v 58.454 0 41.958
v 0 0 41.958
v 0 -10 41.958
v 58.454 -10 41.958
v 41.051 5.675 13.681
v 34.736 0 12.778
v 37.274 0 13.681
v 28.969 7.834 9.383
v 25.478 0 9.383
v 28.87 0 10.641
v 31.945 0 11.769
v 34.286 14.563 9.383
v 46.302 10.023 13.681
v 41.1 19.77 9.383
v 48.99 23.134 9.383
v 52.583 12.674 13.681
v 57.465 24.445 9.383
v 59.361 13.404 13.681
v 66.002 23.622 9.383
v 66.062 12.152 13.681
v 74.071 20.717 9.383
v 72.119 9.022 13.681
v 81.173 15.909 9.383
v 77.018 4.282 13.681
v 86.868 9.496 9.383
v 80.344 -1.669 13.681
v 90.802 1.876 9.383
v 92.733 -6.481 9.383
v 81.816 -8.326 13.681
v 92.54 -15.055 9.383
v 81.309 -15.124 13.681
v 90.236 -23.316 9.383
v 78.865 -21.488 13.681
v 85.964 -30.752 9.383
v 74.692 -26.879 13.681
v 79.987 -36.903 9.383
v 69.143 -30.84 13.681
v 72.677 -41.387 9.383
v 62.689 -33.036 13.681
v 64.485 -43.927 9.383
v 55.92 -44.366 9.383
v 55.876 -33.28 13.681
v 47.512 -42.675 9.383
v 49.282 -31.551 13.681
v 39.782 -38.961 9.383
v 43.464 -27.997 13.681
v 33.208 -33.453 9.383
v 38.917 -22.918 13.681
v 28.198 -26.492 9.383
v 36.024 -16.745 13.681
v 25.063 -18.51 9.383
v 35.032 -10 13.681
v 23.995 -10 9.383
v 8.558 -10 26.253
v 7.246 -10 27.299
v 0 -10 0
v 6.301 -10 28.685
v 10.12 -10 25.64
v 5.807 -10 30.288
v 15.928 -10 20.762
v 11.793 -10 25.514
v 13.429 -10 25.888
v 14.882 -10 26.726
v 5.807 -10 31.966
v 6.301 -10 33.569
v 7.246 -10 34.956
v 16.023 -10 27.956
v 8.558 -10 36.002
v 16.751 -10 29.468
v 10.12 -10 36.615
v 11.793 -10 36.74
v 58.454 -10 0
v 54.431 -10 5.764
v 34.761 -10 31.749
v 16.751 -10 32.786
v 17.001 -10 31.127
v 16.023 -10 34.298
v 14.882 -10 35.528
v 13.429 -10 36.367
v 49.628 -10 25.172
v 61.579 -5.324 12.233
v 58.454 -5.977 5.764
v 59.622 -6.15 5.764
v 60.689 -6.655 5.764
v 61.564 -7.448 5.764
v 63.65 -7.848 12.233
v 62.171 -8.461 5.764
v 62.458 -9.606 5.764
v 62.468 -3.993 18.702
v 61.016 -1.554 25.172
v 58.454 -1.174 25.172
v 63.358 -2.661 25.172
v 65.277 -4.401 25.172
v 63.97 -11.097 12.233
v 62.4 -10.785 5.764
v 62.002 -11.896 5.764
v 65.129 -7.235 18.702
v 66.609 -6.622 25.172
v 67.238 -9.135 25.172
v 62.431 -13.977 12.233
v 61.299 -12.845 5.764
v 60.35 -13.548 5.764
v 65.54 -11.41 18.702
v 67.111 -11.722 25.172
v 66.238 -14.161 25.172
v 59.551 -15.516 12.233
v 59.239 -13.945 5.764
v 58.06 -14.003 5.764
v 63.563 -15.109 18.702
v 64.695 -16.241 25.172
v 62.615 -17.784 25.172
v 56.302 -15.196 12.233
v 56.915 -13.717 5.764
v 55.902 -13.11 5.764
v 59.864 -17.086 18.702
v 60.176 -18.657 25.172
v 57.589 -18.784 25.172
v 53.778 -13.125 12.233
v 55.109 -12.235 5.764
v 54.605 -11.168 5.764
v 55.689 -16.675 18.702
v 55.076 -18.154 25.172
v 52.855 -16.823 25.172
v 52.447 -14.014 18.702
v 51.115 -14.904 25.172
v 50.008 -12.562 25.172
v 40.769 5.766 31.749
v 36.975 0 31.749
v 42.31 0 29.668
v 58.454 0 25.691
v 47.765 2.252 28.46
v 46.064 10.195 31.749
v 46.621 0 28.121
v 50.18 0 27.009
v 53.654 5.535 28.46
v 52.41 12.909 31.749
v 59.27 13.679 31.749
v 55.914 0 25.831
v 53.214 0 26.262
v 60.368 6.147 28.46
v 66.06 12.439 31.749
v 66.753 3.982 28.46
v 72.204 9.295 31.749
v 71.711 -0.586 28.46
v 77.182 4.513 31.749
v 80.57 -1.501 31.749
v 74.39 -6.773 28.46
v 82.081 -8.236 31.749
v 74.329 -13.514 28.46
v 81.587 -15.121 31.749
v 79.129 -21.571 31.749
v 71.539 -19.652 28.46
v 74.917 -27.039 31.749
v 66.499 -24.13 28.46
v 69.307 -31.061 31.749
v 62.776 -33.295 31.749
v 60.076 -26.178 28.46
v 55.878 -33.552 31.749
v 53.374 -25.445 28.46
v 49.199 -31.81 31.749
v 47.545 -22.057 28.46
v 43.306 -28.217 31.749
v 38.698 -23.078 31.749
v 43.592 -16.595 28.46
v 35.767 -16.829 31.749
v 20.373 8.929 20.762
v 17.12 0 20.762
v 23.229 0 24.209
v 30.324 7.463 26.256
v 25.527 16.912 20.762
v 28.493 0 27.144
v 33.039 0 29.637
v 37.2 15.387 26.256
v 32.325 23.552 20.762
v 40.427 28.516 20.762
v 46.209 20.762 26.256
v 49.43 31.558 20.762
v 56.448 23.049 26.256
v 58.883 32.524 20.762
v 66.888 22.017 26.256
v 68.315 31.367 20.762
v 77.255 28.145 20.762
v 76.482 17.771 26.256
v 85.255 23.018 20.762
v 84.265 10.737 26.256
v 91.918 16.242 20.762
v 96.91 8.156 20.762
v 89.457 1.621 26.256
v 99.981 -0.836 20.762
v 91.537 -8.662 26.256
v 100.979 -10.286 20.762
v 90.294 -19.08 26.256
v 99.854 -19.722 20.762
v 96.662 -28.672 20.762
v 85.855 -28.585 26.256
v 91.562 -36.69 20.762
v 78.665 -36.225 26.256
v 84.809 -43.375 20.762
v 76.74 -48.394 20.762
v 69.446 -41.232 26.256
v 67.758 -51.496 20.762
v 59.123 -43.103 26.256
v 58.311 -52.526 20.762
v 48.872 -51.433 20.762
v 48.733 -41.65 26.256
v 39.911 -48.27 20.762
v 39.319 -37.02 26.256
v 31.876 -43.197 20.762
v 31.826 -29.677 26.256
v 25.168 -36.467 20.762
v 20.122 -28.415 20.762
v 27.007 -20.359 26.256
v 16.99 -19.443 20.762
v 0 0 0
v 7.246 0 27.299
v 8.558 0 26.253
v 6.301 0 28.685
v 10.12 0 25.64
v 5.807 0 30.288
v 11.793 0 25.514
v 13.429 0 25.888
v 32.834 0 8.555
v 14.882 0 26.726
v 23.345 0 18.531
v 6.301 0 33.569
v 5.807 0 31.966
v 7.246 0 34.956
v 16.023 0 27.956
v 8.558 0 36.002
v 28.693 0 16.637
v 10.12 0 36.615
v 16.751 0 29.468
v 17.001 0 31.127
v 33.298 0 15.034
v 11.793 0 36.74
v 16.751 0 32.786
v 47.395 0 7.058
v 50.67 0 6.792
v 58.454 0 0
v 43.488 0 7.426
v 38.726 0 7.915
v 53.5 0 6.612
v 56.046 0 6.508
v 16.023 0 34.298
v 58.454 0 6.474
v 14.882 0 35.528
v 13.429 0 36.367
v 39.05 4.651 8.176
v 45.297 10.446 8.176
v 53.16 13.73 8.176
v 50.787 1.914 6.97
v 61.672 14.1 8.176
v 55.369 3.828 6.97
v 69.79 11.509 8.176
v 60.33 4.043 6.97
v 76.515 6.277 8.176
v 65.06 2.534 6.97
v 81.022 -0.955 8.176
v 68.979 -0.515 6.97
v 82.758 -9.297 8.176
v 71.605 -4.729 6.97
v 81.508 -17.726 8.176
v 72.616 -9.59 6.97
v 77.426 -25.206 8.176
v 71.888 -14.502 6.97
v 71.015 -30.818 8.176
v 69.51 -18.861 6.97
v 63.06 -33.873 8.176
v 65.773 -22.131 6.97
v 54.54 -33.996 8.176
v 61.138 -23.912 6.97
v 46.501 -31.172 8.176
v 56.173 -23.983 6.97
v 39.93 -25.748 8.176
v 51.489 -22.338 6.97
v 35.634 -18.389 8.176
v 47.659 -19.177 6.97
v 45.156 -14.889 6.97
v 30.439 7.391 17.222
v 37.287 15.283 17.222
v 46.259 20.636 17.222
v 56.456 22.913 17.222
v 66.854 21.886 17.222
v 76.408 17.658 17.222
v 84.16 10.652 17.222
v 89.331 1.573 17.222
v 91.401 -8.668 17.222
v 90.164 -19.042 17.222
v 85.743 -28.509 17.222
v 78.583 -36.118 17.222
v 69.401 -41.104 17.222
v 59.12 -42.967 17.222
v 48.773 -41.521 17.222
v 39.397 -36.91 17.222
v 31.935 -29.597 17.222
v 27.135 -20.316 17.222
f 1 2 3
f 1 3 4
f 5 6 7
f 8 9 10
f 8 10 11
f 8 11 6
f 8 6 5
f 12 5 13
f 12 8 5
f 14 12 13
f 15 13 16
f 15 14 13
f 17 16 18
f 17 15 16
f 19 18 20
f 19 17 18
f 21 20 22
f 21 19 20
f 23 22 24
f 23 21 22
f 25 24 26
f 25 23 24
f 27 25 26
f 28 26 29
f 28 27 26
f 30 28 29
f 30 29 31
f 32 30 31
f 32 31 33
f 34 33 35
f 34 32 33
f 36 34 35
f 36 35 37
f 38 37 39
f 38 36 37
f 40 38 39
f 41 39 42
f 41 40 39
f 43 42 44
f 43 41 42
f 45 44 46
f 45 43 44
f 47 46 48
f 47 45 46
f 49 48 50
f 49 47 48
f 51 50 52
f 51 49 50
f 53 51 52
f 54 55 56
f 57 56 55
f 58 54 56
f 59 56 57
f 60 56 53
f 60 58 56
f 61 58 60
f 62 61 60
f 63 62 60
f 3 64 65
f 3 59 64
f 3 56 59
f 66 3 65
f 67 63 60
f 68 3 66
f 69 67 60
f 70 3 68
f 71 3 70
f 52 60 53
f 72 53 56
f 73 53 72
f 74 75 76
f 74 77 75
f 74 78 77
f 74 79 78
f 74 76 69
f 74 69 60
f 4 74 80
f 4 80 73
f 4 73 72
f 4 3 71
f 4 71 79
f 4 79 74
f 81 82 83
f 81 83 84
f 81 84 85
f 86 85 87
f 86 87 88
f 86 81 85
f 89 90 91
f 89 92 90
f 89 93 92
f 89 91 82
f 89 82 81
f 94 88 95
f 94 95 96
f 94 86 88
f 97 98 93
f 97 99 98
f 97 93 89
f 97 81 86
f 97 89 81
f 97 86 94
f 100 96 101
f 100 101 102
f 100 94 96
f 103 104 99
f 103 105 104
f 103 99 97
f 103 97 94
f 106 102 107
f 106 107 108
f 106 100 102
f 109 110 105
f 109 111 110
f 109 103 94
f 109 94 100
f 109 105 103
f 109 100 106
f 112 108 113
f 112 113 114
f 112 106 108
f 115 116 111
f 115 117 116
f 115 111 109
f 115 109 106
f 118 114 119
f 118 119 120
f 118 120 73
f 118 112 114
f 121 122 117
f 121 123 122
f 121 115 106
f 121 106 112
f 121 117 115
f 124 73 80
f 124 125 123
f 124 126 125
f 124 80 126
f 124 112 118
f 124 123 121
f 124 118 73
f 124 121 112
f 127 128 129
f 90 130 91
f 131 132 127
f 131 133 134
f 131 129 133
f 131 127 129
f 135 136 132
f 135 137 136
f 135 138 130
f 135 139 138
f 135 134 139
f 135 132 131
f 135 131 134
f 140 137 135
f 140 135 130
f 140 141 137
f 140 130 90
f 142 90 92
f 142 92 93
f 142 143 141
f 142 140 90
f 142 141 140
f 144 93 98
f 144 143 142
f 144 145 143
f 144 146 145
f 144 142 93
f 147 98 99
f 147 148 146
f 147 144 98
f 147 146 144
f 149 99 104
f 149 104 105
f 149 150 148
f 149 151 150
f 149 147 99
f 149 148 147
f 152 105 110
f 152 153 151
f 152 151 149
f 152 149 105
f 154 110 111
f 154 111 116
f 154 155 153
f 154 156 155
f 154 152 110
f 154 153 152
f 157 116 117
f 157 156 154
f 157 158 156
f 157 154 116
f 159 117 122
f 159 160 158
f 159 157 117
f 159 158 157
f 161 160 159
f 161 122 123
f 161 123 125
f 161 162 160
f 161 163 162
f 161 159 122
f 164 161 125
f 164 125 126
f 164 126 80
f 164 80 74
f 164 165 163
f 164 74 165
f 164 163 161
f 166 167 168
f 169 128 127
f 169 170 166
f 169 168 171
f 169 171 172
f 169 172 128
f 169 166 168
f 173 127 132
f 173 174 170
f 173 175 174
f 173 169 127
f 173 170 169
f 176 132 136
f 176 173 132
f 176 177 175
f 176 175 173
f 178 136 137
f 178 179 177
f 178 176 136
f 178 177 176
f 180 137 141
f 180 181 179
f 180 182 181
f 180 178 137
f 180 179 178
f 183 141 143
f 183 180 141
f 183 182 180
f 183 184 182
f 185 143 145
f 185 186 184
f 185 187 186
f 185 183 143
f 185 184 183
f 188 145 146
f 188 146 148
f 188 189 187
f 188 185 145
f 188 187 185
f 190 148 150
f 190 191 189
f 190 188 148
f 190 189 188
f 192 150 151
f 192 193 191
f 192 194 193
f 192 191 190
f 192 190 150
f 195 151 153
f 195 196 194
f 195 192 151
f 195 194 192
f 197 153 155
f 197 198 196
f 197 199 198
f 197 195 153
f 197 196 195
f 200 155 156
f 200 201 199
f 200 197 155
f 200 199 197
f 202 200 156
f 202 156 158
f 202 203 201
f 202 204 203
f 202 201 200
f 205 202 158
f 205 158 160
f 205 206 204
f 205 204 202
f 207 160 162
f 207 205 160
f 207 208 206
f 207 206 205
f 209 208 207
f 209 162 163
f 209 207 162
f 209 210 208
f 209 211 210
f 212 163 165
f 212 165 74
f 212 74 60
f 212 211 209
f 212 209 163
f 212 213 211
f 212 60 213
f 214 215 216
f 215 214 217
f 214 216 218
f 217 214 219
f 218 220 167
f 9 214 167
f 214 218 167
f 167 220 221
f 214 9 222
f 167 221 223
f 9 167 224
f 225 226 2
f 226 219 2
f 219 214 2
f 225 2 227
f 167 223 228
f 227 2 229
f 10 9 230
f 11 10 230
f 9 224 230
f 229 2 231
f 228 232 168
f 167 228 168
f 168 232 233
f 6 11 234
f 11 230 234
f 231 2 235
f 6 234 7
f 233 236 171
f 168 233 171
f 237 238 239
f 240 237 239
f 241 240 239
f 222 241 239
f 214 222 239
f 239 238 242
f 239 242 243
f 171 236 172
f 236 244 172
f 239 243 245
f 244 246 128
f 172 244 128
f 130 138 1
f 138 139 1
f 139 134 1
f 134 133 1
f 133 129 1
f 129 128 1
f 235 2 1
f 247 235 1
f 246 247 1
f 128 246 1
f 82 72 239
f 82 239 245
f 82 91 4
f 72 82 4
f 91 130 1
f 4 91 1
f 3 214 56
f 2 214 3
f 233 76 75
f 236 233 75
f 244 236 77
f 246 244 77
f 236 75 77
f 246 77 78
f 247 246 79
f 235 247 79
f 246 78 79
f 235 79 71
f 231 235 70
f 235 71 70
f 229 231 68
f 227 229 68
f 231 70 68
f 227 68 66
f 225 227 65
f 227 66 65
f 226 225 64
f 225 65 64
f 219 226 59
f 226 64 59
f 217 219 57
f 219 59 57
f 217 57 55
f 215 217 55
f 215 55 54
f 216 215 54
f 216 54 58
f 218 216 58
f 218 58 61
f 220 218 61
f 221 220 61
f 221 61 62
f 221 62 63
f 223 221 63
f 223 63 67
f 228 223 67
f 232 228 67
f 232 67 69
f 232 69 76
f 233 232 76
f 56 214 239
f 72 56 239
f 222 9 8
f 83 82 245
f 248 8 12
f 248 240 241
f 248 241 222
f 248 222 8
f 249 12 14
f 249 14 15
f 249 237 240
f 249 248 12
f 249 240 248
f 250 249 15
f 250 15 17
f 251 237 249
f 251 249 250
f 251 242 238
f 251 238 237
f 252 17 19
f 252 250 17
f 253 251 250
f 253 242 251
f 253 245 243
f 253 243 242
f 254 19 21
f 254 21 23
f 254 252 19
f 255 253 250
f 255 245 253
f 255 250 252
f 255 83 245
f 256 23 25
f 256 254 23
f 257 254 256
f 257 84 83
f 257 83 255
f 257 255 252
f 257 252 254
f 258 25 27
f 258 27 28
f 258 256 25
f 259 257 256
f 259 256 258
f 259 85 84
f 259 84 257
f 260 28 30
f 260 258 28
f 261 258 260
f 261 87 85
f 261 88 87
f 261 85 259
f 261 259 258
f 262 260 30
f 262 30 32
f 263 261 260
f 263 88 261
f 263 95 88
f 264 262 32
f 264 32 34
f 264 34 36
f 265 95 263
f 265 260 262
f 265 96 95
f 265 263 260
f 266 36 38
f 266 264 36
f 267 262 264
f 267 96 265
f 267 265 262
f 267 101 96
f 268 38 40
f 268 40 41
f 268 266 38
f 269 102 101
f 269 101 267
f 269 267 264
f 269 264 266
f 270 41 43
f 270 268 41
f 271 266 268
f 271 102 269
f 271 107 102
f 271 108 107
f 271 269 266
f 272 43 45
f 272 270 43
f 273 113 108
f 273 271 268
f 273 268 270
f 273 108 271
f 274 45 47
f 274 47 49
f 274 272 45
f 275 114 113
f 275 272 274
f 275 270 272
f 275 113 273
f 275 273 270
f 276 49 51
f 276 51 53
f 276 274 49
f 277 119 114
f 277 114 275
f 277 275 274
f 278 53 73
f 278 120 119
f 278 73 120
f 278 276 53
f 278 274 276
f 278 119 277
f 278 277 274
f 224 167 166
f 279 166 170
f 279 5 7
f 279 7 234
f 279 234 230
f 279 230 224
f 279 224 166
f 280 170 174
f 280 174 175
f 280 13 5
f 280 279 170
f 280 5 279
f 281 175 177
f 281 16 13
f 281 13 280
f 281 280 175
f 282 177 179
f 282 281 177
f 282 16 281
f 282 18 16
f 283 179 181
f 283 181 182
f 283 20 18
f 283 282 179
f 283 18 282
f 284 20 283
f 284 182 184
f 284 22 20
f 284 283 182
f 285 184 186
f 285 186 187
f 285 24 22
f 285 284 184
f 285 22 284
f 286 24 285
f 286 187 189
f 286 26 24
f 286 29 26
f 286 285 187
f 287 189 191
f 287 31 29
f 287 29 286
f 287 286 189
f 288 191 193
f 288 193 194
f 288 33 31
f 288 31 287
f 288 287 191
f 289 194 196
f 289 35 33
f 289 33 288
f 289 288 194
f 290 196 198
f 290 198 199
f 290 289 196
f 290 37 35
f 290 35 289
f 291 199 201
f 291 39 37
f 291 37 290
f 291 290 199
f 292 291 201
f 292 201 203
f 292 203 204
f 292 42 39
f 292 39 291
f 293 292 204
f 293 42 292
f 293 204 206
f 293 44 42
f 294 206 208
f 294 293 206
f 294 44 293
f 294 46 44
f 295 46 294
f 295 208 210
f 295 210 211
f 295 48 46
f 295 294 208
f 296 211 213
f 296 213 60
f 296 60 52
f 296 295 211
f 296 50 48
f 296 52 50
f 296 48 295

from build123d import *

# Parameters (mm, degrees)
F0_W     = 58.45416
F0_H     = 41.958041
F1_DEPTH = 10
F2_R     = 5.628683
F3_DEPTH = 10.001


with BuildPart() as f1:
    # F0 (on Front) → F1 (new body)
    with BuildSketch(Plane.XZ):
        with Locations((29.22708, 20.979021)):
            Rectangle(F0_W, F0_H)
    extrude(amount=F1_DEPTH)

    # F2 (on face) → F3 (cut, through all)
    with BuildSketch(Plane.XZ.offset(10)):
        with Locations((11.372562, 31.127132)):
            Circle(F2_R)
    extrude(amount=-F3_DEPTH, mode=Mode.SUBTRACT)

    # F4 (on face) → F5 (revolve)
    with BuildSketch(Plane.XZ.offset(10)):
        Polygon((49.627889, 25.171686), (34.761366, 31.748787), (15.927874, 20.762276), (35.032336, 13.681269), (23.995256, 9.382639), (54.431368, 5.763666), align=None)
    revolve(axis=Axis((58.45416, -10, 20.979021), (0, 0, -1)))


solid = f1.part
